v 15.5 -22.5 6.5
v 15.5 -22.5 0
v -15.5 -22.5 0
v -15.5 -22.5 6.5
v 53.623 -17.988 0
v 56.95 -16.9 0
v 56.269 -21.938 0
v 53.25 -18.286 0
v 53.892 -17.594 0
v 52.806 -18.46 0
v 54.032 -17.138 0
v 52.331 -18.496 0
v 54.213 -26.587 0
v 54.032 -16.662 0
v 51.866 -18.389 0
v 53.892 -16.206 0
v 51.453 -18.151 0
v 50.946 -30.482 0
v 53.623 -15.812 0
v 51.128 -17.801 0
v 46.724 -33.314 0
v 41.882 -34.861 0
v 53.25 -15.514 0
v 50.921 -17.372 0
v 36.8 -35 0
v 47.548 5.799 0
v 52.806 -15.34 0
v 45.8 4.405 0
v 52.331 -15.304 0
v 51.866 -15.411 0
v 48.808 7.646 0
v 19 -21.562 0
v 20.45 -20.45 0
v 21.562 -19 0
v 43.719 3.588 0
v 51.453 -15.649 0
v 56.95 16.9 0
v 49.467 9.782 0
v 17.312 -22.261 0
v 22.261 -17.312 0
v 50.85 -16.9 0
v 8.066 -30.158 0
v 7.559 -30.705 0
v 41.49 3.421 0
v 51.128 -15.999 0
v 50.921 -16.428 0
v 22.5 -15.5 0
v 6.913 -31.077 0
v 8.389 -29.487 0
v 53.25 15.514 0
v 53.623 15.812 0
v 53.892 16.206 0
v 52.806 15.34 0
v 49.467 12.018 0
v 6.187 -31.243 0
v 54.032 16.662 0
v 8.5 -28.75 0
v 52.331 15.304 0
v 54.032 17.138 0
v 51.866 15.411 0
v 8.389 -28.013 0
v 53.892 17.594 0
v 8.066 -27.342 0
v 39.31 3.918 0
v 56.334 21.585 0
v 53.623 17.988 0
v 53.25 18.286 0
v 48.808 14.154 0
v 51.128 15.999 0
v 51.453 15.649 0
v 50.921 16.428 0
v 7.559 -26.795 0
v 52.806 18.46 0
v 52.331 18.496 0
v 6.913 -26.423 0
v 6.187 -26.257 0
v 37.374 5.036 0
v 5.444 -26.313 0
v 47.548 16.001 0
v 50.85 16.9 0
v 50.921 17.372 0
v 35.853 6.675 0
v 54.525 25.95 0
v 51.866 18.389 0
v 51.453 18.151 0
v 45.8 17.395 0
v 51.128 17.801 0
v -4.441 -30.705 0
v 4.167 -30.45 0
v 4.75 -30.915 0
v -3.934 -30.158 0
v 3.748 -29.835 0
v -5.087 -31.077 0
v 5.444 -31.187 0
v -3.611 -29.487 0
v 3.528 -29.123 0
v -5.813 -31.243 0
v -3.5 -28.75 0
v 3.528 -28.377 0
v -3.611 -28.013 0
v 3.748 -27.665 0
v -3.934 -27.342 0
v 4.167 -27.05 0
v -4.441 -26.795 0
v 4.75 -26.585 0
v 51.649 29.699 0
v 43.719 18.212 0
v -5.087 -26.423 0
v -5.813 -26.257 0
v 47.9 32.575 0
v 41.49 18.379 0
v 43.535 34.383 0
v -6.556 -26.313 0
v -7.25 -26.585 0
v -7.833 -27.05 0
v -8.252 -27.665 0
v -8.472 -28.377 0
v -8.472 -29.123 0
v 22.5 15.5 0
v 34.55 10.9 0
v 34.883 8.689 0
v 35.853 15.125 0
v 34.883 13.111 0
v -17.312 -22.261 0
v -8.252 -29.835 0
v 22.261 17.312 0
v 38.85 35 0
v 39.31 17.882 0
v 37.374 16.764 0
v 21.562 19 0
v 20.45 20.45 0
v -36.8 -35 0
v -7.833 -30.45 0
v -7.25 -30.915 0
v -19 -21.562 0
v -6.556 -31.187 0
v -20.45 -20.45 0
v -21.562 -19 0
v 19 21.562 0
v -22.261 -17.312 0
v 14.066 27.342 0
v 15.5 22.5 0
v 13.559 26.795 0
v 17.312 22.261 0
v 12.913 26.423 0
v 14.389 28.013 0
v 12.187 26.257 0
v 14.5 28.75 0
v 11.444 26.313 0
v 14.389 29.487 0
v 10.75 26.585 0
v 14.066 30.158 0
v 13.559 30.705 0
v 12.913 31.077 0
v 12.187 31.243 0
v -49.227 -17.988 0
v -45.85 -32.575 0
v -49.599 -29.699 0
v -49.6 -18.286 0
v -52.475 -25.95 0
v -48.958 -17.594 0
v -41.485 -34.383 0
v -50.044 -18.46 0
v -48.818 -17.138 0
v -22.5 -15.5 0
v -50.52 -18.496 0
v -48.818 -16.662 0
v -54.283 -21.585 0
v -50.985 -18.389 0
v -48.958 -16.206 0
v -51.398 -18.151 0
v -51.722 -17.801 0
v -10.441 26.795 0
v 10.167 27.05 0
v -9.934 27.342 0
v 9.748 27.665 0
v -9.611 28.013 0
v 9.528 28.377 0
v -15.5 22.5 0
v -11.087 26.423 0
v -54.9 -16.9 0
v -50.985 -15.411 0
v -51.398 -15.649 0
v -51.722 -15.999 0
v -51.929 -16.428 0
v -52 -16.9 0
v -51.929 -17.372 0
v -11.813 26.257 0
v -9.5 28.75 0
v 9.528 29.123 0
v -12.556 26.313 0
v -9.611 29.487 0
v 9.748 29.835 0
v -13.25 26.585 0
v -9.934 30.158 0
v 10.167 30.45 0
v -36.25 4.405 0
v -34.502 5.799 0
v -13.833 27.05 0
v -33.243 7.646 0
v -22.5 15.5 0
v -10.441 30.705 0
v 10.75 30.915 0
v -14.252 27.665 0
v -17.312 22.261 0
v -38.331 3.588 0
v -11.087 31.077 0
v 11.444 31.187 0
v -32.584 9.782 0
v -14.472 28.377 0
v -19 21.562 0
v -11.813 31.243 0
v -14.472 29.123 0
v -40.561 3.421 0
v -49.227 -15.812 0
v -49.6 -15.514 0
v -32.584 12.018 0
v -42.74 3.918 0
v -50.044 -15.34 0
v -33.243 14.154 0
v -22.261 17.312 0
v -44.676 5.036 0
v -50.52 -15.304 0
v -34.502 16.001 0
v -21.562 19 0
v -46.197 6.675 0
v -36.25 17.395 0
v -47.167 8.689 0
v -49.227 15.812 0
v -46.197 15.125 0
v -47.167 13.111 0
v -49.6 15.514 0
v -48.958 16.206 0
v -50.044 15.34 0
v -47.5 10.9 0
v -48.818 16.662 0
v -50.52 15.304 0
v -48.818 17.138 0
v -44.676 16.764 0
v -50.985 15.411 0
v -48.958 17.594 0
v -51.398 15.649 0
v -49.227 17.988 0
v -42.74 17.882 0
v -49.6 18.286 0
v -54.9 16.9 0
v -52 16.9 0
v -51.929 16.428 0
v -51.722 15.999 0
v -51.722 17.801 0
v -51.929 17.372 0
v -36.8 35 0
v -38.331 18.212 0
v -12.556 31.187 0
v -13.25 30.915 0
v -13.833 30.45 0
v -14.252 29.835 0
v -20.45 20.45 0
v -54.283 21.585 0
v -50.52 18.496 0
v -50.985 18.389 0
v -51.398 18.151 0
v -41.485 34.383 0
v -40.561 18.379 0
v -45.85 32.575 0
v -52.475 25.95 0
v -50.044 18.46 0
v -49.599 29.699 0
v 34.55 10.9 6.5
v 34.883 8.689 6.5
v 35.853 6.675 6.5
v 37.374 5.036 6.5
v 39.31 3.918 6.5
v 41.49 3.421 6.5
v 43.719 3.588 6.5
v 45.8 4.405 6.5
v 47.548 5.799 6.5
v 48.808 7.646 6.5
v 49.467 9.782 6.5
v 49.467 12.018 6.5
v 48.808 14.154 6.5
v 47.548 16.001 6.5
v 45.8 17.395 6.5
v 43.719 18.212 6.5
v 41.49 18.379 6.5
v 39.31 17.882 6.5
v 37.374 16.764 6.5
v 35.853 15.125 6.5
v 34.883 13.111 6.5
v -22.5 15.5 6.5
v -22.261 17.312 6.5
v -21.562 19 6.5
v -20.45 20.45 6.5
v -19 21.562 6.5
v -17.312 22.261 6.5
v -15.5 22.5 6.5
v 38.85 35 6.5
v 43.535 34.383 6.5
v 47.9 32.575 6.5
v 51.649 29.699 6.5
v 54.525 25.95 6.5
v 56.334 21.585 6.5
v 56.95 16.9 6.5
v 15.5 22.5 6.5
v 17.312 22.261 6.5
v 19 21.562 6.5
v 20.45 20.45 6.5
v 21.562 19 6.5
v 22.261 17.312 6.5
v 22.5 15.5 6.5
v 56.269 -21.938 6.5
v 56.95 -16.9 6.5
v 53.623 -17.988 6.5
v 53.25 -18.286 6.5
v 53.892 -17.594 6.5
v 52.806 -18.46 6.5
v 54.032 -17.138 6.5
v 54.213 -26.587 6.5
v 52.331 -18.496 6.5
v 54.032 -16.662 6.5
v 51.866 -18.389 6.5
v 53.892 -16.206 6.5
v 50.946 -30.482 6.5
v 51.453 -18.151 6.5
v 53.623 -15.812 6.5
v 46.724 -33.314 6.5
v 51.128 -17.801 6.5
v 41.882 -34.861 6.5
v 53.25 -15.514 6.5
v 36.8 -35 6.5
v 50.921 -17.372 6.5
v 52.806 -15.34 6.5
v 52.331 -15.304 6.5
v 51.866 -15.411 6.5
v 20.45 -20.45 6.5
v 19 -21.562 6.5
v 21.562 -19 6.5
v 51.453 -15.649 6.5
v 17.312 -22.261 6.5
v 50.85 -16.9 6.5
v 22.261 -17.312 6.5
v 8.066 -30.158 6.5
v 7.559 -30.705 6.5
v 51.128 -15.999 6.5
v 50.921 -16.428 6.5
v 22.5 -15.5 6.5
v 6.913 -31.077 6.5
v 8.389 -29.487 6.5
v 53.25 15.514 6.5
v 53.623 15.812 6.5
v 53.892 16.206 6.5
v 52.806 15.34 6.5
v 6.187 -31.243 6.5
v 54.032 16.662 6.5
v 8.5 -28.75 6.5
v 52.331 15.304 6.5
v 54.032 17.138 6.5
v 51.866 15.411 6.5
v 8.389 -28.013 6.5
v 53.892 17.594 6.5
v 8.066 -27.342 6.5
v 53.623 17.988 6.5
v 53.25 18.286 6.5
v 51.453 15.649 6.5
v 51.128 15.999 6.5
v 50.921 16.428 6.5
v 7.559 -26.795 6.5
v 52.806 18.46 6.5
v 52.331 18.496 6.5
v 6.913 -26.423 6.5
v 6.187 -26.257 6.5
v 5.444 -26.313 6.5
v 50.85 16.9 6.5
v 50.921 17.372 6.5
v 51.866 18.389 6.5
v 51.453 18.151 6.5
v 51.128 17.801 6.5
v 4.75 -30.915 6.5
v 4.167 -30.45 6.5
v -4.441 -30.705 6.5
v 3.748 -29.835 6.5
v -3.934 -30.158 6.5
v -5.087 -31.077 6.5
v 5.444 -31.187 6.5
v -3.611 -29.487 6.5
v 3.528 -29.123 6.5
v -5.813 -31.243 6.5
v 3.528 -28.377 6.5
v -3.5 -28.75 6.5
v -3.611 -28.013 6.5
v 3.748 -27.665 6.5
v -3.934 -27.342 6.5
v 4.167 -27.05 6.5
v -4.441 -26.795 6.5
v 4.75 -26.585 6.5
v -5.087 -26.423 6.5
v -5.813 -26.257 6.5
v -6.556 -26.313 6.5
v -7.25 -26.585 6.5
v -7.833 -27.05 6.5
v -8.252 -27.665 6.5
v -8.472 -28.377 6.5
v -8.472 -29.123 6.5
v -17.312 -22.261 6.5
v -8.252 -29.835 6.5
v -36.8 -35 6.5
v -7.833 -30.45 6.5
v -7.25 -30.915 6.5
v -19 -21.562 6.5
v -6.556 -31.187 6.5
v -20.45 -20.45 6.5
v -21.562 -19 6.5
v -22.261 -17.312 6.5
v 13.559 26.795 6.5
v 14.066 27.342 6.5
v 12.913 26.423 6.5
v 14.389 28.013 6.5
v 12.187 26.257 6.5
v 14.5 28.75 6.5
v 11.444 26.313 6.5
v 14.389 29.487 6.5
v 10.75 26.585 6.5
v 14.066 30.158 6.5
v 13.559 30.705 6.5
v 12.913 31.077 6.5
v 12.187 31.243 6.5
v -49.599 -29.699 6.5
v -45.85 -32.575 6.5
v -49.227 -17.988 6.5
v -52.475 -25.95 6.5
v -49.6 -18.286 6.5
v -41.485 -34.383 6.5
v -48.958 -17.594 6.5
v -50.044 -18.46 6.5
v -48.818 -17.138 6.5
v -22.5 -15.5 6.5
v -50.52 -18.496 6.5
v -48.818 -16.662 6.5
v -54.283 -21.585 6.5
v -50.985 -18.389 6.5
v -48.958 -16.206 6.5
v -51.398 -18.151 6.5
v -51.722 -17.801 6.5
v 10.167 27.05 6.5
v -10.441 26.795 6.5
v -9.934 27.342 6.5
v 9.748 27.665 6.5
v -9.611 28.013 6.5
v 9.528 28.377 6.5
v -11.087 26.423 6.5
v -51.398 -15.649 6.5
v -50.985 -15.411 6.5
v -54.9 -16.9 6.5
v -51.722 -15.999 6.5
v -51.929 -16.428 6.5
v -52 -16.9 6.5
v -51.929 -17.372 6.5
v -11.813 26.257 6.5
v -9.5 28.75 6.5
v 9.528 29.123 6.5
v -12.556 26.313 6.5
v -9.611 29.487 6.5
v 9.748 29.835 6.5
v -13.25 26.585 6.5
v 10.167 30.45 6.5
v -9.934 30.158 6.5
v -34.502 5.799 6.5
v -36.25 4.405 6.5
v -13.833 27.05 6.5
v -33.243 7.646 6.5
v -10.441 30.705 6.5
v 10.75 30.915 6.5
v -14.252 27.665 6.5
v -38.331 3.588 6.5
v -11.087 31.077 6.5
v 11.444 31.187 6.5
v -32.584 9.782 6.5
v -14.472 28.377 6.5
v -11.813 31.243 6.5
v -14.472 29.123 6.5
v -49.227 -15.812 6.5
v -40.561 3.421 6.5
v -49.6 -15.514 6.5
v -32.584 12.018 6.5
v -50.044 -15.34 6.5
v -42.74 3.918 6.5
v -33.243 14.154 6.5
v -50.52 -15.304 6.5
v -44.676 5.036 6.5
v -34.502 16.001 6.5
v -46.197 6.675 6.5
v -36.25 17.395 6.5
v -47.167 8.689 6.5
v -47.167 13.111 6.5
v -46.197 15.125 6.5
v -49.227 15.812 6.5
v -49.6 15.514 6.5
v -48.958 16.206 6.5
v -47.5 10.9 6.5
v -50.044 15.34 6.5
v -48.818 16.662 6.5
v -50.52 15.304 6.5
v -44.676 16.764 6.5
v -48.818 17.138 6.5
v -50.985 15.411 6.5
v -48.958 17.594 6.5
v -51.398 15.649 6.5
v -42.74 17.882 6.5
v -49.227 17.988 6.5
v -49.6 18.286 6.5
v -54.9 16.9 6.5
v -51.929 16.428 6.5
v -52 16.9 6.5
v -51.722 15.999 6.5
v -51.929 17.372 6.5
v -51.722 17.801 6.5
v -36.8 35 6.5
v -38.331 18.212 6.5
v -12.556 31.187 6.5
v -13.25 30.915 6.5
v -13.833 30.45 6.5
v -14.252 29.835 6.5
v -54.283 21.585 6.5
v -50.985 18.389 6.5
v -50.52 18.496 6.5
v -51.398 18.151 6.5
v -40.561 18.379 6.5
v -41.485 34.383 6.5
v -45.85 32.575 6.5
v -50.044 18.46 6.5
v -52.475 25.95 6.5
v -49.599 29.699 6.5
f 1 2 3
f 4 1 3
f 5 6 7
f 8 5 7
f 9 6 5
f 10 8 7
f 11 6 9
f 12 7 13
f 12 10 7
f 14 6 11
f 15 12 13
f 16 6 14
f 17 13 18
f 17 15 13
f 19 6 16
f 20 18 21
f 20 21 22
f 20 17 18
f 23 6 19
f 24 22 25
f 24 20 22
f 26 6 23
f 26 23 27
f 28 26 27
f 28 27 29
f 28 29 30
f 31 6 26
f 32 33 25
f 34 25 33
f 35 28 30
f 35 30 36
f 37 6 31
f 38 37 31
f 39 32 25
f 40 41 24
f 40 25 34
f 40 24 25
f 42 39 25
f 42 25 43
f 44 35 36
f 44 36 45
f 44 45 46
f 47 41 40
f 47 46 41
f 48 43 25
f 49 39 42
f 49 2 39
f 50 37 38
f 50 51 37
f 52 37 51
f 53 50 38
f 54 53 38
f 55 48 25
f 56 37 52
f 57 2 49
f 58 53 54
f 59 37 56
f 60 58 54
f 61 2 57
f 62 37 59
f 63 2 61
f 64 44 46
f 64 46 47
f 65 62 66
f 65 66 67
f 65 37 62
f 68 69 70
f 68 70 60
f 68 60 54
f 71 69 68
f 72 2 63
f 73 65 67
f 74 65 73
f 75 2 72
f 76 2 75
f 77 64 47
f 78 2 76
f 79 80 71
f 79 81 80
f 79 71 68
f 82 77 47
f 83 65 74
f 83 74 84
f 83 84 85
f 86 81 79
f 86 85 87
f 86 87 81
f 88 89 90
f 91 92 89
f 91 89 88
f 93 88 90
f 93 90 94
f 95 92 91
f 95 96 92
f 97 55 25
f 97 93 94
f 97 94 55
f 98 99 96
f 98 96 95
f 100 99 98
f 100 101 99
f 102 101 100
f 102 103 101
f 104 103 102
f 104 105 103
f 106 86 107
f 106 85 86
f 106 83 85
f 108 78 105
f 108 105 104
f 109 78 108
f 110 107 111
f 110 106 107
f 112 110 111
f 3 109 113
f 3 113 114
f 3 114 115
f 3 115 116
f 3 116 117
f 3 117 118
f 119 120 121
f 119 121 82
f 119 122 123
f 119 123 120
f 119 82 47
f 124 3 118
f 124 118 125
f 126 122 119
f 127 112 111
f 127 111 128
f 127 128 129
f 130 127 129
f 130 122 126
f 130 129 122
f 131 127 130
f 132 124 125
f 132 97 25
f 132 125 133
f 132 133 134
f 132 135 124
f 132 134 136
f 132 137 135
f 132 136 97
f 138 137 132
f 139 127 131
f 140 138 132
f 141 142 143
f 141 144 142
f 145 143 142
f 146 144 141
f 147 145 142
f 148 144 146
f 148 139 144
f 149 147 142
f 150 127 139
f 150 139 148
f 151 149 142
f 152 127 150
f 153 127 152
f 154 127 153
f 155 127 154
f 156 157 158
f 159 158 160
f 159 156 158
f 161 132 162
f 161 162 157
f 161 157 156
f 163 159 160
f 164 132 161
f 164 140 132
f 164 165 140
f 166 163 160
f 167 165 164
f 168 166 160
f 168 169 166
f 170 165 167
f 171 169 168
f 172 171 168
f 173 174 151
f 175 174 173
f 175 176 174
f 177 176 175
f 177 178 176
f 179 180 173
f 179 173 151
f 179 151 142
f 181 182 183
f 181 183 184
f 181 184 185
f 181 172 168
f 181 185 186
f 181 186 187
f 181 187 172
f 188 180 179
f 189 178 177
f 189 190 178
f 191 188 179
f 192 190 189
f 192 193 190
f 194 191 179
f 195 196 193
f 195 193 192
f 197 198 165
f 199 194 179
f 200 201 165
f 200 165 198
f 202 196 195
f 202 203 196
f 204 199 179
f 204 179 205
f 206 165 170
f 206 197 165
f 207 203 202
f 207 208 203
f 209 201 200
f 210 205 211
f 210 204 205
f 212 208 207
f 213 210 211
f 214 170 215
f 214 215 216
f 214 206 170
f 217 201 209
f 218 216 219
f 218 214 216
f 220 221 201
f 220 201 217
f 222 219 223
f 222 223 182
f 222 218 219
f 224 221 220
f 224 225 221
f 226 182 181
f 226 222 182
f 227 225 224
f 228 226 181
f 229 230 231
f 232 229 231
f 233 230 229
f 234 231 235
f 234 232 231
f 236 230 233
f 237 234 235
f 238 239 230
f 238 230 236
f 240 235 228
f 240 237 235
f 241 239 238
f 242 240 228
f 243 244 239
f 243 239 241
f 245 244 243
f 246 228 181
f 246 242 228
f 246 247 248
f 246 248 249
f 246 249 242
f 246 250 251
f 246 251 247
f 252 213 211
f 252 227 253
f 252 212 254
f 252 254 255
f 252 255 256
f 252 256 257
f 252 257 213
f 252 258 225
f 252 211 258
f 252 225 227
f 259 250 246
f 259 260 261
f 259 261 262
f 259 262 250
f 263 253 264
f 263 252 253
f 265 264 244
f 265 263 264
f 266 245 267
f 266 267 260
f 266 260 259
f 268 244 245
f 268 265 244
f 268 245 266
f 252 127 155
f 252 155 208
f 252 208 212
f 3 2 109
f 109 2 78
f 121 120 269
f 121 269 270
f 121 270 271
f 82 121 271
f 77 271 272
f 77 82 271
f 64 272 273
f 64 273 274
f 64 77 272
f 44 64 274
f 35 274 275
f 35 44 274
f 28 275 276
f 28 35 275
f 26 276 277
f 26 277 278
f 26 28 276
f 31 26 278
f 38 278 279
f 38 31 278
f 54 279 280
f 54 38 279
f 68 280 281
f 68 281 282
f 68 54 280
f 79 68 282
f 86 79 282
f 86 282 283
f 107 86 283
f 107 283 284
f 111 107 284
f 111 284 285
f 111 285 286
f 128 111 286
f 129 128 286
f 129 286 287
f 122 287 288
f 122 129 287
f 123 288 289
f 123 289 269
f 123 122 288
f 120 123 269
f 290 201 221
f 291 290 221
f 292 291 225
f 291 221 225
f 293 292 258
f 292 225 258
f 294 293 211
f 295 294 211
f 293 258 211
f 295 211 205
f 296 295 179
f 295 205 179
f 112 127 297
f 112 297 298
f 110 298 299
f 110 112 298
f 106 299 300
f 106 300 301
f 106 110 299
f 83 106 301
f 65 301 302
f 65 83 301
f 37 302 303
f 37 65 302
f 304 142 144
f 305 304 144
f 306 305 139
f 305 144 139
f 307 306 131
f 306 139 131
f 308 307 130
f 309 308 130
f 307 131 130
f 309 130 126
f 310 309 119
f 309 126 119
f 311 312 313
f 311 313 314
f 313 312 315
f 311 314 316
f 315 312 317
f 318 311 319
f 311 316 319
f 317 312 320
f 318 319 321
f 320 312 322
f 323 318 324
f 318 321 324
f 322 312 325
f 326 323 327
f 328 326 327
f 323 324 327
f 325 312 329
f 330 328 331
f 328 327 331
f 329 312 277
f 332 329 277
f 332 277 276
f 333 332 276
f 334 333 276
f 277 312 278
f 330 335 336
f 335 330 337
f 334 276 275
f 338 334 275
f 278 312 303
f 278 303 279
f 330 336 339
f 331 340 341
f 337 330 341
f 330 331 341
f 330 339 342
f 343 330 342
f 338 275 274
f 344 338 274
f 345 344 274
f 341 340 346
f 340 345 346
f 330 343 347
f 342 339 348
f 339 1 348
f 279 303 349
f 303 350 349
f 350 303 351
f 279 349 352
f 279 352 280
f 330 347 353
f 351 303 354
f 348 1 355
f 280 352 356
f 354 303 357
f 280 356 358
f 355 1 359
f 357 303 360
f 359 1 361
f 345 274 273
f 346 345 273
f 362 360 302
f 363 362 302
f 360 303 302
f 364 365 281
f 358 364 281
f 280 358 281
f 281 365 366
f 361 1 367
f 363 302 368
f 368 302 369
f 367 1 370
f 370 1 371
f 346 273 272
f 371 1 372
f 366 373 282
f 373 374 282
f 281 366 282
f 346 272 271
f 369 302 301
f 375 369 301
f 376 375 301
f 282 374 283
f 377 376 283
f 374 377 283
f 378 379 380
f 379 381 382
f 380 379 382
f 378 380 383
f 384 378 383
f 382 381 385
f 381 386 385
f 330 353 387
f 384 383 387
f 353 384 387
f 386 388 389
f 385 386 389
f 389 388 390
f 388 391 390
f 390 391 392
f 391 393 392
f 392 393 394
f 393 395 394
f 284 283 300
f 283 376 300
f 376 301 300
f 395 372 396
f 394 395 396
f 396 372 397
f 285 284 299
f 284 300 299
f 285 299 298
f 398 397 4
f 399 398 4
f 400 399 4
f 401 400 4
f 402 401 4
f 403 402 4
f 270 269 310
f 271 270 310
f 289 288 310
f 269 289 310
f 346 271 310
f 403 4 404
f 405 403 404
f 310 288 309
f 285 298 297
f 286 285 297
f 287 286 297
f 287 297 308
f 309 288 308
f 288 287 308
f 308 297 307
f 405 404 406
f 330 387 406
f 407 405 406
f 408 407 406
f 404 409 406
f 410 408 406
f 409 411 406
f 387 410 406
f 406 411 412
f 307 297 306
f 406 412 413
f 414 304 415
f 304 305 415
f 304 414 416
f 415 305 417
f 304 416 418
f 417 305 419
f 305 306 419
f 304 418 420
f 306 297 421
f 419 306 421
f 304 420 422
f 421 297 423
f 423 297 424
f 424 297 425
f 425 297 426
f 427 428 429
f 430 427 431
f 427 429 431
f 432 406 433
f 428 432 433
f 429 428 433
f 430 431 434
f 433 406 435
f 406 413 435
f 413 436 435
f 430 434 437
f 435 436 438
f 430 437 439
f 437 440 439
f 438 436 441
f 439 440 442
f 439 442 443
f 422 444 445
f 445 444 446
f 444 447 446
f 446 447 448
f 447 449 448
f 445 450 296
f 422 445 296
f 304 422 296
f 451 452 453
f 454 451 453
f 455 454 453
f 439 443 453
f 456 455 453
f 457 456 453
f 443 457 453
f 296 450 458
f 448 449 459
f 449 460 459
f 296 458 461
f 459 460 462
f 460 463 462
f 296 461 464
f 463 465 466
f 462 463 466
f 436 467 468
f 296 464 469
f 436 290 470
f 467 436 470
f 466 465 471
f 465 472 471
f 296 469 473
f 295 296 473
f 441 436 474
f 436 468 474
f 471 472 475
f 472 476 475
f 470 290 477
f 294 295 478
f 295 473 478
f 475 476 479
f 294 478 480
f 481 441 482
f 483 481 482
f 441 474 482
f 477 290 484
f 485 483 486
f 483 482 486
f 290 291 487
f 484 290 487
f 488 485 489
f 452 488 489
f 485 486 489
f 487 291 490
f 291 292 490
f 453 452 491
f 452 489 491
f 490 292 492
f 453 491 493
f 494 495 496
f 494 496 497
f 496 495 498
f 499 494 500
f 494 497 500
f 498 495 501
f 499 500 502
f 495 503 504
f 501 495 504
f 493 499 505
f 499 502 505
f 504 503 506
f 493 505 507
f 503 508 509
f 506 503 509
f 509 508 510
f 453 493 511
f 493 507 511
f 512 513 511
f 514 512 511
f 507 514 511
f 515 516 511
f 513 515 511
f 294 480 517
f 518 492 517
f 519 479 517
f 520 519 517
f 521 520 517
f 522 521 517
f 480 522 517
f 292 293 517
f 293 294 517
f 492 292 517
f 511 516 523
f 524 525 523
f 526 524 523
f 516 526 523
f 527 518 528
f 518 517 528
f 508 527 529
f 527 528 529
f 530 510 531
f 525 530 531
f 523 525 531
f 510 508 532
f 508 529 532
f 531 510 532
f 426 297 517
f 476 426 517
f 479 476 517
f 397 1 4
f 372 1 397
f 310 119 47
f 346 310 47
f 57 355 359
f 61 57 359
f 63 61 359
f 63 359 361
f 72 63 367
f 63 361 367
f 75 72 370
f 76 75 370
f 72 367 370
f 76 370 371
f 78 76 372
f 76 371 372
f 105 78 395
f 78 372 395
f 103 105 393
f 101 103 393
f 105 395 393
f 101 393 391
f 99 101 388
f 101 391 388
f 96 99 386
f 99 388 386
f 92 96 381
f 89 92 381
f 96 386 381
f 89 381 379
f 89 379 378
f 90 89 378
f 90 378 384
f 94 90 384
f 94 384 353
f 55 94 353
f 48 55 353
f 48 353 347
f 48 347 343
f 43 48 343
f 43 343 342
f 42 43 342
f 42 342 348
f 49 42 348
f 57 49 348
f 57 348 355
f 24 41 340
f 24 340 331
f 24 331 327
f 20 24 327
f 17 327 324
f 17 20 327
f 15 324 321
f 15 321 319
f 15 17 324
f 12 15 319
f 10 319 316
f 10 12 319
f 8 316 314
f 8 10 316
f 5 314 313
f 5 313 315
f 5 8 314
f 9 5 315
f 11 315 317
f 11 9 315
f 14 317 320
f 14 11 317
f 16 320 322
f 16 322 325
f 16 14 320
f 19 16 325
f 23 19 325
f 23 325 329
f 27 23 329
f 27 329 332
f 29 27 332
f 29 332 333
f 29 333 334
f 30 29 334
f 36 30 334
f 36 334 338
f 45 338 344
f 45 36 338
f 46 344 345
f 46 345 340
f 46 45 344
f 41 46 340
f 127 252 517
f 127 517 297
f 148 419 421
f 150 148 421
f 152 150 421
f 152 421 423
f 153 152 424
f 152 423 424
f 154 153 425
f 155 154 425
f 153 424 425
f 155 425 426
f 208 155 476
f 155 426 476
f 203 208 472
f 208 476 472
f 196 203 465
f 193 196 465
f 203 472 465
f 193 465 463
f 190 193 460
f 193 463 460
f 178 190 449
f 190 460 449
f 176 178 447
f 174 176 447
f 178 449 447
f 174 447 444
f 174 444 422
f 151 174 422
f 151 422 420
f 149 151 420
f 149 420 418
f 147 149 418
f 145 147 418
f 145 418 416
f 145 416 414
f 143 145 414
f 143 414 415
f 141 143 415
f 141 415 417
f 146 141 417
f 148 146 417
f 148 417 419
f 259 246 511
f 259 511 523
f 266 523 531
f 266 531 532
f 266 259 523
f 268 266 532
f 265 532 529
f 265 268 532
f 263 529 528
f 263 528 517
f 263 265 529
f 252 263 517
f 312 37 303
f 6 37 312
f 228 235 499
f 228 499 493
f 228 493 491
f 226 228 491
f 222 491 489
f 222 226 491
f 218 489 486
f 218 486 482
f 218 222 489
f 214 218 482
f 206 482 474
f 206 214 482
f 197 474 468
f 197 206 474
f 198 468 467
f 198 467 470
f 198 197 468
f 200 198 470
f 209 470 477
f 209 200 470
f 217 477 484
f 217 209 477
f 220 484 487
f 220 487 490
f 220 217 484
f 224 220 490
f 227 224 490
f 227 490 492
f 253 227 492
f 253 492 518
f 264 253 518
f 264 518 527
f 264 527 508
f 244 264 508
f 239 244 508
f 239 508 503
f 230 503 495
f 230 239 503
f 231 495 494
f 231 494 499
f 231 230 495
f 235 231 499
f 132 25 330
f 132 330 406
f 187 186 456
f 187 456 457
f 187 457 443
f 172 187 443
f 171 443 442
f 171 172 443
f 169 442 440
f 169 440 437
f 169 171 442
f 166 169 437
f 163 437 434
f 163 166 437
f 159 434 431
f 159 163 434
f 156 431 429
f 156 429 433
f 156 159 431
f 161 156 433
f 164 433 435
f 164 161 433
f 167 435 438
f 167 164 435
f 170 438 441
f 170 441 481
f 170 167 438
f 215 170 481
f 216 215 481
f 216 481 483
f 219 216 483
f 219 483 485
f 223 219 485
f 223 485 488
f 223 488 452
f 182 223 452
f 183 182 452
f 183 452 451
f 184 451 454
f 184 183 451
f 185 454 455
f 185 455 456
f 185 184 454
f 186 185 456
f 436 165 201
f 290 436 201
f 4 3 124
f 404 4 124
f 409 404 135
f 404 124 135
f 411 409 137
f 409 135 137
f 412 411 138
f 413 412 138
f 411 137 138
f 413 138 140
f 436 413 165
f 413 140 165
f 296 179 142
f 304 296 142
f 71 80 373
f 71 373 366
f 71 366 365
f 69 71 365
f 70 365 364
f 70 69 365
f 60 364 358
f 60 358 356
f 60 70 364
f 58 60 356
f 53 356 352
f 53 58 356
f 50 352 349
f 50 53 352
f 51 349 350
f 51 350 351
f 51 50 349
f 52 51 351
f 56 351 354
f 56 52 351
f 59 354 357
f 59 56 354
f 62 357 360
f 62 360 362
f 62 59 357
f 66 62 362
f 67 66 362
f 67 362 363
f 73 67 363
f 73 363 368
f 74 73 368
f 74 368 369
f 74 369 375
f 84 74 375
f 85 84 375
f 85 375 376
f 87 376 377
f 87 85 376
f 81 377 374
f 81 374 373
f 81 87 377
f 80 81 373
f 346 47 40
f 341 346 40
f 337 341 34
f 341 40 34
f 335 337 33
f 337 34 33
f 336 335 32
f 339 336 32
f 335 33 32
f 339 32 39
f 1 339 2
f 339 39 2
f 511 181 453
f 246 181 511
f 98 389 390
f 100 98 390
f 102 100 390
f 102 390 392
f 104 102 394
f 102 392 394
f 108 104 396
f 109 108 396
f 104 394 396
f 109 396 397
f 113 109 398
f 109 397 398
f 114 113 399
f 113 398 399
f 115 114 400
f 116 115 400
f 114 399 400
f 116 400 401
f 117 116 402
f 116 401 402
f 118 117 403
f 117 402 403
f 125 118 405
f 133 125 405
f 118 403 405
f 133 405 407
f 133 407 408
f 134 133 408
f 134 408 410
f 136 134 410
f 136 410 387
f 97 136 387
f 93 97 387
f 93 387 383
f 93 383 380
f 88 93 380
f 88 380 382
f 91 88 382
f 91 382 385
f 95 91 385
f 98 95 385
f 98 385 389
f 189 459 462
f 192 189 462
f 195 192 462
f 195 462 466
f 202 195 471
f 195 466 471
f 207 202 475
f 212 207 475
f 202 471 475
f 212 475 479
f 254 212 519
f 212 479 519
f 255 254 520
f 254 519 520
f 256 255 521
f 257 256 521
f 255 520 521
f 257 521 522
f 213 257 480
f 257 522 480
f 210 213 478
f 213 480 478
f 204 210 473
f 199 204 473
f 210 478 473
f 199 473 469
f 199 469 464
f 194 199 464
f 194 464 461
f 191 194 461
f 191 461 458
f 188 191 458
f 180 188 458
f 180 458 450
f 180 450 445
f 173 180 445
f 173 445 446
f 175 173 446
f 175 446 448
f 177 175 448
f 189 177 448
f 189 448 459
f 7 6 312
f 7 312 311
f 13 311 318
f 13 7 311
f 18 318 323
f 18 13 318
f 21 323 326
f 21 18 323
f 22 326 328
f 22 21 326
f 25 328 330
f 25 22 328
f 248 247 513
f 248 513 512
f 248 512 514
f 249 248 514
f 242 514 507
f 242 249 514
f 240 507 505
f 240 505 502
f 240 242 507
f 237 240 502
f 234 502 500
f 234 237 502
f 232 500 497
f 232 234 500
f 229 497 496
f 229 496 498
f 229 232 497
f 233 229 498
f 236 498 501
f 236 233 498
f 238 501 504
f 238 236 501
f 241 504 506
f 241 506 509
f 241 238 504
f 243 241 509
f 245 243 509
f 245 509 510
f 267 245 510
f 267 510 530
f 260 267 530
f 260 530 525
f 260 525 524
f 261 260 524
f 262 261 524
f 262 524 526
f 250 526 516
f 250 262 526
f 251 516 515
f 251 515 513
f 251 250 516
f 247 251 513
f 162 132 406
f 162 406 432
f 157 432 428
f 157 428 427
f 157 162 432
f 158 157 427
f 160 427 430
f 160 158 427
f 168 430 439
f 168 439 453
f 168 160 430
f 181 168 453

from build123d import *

# Parameters (mm, degrees)
SKETCH_1_R          = 1.6
SKETCH_1_R_2        = 7.5
EXTRUDE_1_DEPTH     = 6.5
SKETCH_3_R          = 2.5
CUT_EXTRUDE_1_DEPTH = 68.222006253


with BuildPart() as part:
    # 草图1 → 凸台-拉伸1 (new body)
    with BuildSketch(Plane.XY):
        with BuildLine():
            Line((-36.800051208, 35), (38.850303739, 35))
            ThreePointArc((38.850303739, 35), (51.648918374, 29.698640239), (56.950278135, 16.900025604))
            Line((56.950278135, 16.900025604), (56.950278135, -16.900025604))
            ThreePointArc((56.950278135, -16.900025604), (50.945911029, -30.48186799), (36.800051208, -35))
            Line((36.800051208, -35), (-36.800051208, -35))
            ThreePointArc((-36.800051208, -35), (-49.598665842, -29.698640239), (-54.900025604, -16.900025604))
            Line((-54.900025604, -16.900025604), (-54.900025604, 16.900025604))
            ThreePointArc((-54.900025604, 16.900025604), (-49.598665842, 29.698640239), (-36.800051208, 35))
        make_face()
        with Locations(Location((-50.400025604, 16.900025604, 0), (0, 0, 180))):
            Circle(SKETCH_1_R, mode=Mode.SUBTRACT)
        with Locations(Location((-40.000025604, 10.900025604, 0), (0, 0, 180))):
            Circle(SKETCH_1_R_2, mode=Mode.SUBTRACT)
        with Locations(Location((52.450278135, 16.900025604, 0), (0, 0, 180))):
            Circle(SKETCH_1_R, mode=Mode.SUBTRACT)
        with Locations(Location((42.050278135, 10.900025604, 0), (0, 0, 180))):
            Circle(SKETCH_1_R_2, mode=Mode.SUBTRACT)
        with Locations(Location((52.450278135, -16.900025604, 0), (0, 0, 180))):
            Circle(SKETCH_1_R, mode=Mode.SUBTRACT)
        with Locations(Location((-50.400025604, -16.900025604, 0), (0, 0, 180))):
            Circle(SKETCH_1_R, mode=Mode.SUBTRACT)
        with BuildLine():
            Line((-15.5, 22.5), (15.5, 22.5))
            ThreePointArc((15.5, 22.5), (20.449747468, 20.449747468), (22.5, 15.5))
            Line((22.5, 15.5), (22.5, -15.5))
            ThreePointArc((22.5, -15.5), (20.449747468, -20.449747468), (15.5, -22.5))
            Line((15.5, -22.5), (-15.5, -22.5))
            ThreePointArc((-15.5, -22.5), (-20.449747468, -20.449747468), (-22.5, -15.5))
            Line((-22.5, -15.5), (-22.5, 15.5))
            ThreePointArc((-22.5, 15.5), (-20.449747468, 20.449747468), (-15.5, 22.5))
        make_face(mode=Mode.SUBTRACT)
    extrude(amount=EXTRUDE_1_DEPTH)

    # 草图3 → 切除-拉伸1 (cut, through all)
    with BuildSketch(Plane.XY.offset(6.5)):
        with Locations((-12, 28.75)):
            Circle(SKETCH_3_R)
        with Locations((12, 28.75)):
            Circle(SKETCH_3_R)
        with Locations((-6, -28.75)):
            Circle(SKETCH_3_R)
        with Locations((6, -28.75)):
            Circle(SKETCH_3_R)
    extrude(amount=-CUT_EXTRUDE_1_DEPTH, mode=Mode.SUBTRACT)


solid = part.part
